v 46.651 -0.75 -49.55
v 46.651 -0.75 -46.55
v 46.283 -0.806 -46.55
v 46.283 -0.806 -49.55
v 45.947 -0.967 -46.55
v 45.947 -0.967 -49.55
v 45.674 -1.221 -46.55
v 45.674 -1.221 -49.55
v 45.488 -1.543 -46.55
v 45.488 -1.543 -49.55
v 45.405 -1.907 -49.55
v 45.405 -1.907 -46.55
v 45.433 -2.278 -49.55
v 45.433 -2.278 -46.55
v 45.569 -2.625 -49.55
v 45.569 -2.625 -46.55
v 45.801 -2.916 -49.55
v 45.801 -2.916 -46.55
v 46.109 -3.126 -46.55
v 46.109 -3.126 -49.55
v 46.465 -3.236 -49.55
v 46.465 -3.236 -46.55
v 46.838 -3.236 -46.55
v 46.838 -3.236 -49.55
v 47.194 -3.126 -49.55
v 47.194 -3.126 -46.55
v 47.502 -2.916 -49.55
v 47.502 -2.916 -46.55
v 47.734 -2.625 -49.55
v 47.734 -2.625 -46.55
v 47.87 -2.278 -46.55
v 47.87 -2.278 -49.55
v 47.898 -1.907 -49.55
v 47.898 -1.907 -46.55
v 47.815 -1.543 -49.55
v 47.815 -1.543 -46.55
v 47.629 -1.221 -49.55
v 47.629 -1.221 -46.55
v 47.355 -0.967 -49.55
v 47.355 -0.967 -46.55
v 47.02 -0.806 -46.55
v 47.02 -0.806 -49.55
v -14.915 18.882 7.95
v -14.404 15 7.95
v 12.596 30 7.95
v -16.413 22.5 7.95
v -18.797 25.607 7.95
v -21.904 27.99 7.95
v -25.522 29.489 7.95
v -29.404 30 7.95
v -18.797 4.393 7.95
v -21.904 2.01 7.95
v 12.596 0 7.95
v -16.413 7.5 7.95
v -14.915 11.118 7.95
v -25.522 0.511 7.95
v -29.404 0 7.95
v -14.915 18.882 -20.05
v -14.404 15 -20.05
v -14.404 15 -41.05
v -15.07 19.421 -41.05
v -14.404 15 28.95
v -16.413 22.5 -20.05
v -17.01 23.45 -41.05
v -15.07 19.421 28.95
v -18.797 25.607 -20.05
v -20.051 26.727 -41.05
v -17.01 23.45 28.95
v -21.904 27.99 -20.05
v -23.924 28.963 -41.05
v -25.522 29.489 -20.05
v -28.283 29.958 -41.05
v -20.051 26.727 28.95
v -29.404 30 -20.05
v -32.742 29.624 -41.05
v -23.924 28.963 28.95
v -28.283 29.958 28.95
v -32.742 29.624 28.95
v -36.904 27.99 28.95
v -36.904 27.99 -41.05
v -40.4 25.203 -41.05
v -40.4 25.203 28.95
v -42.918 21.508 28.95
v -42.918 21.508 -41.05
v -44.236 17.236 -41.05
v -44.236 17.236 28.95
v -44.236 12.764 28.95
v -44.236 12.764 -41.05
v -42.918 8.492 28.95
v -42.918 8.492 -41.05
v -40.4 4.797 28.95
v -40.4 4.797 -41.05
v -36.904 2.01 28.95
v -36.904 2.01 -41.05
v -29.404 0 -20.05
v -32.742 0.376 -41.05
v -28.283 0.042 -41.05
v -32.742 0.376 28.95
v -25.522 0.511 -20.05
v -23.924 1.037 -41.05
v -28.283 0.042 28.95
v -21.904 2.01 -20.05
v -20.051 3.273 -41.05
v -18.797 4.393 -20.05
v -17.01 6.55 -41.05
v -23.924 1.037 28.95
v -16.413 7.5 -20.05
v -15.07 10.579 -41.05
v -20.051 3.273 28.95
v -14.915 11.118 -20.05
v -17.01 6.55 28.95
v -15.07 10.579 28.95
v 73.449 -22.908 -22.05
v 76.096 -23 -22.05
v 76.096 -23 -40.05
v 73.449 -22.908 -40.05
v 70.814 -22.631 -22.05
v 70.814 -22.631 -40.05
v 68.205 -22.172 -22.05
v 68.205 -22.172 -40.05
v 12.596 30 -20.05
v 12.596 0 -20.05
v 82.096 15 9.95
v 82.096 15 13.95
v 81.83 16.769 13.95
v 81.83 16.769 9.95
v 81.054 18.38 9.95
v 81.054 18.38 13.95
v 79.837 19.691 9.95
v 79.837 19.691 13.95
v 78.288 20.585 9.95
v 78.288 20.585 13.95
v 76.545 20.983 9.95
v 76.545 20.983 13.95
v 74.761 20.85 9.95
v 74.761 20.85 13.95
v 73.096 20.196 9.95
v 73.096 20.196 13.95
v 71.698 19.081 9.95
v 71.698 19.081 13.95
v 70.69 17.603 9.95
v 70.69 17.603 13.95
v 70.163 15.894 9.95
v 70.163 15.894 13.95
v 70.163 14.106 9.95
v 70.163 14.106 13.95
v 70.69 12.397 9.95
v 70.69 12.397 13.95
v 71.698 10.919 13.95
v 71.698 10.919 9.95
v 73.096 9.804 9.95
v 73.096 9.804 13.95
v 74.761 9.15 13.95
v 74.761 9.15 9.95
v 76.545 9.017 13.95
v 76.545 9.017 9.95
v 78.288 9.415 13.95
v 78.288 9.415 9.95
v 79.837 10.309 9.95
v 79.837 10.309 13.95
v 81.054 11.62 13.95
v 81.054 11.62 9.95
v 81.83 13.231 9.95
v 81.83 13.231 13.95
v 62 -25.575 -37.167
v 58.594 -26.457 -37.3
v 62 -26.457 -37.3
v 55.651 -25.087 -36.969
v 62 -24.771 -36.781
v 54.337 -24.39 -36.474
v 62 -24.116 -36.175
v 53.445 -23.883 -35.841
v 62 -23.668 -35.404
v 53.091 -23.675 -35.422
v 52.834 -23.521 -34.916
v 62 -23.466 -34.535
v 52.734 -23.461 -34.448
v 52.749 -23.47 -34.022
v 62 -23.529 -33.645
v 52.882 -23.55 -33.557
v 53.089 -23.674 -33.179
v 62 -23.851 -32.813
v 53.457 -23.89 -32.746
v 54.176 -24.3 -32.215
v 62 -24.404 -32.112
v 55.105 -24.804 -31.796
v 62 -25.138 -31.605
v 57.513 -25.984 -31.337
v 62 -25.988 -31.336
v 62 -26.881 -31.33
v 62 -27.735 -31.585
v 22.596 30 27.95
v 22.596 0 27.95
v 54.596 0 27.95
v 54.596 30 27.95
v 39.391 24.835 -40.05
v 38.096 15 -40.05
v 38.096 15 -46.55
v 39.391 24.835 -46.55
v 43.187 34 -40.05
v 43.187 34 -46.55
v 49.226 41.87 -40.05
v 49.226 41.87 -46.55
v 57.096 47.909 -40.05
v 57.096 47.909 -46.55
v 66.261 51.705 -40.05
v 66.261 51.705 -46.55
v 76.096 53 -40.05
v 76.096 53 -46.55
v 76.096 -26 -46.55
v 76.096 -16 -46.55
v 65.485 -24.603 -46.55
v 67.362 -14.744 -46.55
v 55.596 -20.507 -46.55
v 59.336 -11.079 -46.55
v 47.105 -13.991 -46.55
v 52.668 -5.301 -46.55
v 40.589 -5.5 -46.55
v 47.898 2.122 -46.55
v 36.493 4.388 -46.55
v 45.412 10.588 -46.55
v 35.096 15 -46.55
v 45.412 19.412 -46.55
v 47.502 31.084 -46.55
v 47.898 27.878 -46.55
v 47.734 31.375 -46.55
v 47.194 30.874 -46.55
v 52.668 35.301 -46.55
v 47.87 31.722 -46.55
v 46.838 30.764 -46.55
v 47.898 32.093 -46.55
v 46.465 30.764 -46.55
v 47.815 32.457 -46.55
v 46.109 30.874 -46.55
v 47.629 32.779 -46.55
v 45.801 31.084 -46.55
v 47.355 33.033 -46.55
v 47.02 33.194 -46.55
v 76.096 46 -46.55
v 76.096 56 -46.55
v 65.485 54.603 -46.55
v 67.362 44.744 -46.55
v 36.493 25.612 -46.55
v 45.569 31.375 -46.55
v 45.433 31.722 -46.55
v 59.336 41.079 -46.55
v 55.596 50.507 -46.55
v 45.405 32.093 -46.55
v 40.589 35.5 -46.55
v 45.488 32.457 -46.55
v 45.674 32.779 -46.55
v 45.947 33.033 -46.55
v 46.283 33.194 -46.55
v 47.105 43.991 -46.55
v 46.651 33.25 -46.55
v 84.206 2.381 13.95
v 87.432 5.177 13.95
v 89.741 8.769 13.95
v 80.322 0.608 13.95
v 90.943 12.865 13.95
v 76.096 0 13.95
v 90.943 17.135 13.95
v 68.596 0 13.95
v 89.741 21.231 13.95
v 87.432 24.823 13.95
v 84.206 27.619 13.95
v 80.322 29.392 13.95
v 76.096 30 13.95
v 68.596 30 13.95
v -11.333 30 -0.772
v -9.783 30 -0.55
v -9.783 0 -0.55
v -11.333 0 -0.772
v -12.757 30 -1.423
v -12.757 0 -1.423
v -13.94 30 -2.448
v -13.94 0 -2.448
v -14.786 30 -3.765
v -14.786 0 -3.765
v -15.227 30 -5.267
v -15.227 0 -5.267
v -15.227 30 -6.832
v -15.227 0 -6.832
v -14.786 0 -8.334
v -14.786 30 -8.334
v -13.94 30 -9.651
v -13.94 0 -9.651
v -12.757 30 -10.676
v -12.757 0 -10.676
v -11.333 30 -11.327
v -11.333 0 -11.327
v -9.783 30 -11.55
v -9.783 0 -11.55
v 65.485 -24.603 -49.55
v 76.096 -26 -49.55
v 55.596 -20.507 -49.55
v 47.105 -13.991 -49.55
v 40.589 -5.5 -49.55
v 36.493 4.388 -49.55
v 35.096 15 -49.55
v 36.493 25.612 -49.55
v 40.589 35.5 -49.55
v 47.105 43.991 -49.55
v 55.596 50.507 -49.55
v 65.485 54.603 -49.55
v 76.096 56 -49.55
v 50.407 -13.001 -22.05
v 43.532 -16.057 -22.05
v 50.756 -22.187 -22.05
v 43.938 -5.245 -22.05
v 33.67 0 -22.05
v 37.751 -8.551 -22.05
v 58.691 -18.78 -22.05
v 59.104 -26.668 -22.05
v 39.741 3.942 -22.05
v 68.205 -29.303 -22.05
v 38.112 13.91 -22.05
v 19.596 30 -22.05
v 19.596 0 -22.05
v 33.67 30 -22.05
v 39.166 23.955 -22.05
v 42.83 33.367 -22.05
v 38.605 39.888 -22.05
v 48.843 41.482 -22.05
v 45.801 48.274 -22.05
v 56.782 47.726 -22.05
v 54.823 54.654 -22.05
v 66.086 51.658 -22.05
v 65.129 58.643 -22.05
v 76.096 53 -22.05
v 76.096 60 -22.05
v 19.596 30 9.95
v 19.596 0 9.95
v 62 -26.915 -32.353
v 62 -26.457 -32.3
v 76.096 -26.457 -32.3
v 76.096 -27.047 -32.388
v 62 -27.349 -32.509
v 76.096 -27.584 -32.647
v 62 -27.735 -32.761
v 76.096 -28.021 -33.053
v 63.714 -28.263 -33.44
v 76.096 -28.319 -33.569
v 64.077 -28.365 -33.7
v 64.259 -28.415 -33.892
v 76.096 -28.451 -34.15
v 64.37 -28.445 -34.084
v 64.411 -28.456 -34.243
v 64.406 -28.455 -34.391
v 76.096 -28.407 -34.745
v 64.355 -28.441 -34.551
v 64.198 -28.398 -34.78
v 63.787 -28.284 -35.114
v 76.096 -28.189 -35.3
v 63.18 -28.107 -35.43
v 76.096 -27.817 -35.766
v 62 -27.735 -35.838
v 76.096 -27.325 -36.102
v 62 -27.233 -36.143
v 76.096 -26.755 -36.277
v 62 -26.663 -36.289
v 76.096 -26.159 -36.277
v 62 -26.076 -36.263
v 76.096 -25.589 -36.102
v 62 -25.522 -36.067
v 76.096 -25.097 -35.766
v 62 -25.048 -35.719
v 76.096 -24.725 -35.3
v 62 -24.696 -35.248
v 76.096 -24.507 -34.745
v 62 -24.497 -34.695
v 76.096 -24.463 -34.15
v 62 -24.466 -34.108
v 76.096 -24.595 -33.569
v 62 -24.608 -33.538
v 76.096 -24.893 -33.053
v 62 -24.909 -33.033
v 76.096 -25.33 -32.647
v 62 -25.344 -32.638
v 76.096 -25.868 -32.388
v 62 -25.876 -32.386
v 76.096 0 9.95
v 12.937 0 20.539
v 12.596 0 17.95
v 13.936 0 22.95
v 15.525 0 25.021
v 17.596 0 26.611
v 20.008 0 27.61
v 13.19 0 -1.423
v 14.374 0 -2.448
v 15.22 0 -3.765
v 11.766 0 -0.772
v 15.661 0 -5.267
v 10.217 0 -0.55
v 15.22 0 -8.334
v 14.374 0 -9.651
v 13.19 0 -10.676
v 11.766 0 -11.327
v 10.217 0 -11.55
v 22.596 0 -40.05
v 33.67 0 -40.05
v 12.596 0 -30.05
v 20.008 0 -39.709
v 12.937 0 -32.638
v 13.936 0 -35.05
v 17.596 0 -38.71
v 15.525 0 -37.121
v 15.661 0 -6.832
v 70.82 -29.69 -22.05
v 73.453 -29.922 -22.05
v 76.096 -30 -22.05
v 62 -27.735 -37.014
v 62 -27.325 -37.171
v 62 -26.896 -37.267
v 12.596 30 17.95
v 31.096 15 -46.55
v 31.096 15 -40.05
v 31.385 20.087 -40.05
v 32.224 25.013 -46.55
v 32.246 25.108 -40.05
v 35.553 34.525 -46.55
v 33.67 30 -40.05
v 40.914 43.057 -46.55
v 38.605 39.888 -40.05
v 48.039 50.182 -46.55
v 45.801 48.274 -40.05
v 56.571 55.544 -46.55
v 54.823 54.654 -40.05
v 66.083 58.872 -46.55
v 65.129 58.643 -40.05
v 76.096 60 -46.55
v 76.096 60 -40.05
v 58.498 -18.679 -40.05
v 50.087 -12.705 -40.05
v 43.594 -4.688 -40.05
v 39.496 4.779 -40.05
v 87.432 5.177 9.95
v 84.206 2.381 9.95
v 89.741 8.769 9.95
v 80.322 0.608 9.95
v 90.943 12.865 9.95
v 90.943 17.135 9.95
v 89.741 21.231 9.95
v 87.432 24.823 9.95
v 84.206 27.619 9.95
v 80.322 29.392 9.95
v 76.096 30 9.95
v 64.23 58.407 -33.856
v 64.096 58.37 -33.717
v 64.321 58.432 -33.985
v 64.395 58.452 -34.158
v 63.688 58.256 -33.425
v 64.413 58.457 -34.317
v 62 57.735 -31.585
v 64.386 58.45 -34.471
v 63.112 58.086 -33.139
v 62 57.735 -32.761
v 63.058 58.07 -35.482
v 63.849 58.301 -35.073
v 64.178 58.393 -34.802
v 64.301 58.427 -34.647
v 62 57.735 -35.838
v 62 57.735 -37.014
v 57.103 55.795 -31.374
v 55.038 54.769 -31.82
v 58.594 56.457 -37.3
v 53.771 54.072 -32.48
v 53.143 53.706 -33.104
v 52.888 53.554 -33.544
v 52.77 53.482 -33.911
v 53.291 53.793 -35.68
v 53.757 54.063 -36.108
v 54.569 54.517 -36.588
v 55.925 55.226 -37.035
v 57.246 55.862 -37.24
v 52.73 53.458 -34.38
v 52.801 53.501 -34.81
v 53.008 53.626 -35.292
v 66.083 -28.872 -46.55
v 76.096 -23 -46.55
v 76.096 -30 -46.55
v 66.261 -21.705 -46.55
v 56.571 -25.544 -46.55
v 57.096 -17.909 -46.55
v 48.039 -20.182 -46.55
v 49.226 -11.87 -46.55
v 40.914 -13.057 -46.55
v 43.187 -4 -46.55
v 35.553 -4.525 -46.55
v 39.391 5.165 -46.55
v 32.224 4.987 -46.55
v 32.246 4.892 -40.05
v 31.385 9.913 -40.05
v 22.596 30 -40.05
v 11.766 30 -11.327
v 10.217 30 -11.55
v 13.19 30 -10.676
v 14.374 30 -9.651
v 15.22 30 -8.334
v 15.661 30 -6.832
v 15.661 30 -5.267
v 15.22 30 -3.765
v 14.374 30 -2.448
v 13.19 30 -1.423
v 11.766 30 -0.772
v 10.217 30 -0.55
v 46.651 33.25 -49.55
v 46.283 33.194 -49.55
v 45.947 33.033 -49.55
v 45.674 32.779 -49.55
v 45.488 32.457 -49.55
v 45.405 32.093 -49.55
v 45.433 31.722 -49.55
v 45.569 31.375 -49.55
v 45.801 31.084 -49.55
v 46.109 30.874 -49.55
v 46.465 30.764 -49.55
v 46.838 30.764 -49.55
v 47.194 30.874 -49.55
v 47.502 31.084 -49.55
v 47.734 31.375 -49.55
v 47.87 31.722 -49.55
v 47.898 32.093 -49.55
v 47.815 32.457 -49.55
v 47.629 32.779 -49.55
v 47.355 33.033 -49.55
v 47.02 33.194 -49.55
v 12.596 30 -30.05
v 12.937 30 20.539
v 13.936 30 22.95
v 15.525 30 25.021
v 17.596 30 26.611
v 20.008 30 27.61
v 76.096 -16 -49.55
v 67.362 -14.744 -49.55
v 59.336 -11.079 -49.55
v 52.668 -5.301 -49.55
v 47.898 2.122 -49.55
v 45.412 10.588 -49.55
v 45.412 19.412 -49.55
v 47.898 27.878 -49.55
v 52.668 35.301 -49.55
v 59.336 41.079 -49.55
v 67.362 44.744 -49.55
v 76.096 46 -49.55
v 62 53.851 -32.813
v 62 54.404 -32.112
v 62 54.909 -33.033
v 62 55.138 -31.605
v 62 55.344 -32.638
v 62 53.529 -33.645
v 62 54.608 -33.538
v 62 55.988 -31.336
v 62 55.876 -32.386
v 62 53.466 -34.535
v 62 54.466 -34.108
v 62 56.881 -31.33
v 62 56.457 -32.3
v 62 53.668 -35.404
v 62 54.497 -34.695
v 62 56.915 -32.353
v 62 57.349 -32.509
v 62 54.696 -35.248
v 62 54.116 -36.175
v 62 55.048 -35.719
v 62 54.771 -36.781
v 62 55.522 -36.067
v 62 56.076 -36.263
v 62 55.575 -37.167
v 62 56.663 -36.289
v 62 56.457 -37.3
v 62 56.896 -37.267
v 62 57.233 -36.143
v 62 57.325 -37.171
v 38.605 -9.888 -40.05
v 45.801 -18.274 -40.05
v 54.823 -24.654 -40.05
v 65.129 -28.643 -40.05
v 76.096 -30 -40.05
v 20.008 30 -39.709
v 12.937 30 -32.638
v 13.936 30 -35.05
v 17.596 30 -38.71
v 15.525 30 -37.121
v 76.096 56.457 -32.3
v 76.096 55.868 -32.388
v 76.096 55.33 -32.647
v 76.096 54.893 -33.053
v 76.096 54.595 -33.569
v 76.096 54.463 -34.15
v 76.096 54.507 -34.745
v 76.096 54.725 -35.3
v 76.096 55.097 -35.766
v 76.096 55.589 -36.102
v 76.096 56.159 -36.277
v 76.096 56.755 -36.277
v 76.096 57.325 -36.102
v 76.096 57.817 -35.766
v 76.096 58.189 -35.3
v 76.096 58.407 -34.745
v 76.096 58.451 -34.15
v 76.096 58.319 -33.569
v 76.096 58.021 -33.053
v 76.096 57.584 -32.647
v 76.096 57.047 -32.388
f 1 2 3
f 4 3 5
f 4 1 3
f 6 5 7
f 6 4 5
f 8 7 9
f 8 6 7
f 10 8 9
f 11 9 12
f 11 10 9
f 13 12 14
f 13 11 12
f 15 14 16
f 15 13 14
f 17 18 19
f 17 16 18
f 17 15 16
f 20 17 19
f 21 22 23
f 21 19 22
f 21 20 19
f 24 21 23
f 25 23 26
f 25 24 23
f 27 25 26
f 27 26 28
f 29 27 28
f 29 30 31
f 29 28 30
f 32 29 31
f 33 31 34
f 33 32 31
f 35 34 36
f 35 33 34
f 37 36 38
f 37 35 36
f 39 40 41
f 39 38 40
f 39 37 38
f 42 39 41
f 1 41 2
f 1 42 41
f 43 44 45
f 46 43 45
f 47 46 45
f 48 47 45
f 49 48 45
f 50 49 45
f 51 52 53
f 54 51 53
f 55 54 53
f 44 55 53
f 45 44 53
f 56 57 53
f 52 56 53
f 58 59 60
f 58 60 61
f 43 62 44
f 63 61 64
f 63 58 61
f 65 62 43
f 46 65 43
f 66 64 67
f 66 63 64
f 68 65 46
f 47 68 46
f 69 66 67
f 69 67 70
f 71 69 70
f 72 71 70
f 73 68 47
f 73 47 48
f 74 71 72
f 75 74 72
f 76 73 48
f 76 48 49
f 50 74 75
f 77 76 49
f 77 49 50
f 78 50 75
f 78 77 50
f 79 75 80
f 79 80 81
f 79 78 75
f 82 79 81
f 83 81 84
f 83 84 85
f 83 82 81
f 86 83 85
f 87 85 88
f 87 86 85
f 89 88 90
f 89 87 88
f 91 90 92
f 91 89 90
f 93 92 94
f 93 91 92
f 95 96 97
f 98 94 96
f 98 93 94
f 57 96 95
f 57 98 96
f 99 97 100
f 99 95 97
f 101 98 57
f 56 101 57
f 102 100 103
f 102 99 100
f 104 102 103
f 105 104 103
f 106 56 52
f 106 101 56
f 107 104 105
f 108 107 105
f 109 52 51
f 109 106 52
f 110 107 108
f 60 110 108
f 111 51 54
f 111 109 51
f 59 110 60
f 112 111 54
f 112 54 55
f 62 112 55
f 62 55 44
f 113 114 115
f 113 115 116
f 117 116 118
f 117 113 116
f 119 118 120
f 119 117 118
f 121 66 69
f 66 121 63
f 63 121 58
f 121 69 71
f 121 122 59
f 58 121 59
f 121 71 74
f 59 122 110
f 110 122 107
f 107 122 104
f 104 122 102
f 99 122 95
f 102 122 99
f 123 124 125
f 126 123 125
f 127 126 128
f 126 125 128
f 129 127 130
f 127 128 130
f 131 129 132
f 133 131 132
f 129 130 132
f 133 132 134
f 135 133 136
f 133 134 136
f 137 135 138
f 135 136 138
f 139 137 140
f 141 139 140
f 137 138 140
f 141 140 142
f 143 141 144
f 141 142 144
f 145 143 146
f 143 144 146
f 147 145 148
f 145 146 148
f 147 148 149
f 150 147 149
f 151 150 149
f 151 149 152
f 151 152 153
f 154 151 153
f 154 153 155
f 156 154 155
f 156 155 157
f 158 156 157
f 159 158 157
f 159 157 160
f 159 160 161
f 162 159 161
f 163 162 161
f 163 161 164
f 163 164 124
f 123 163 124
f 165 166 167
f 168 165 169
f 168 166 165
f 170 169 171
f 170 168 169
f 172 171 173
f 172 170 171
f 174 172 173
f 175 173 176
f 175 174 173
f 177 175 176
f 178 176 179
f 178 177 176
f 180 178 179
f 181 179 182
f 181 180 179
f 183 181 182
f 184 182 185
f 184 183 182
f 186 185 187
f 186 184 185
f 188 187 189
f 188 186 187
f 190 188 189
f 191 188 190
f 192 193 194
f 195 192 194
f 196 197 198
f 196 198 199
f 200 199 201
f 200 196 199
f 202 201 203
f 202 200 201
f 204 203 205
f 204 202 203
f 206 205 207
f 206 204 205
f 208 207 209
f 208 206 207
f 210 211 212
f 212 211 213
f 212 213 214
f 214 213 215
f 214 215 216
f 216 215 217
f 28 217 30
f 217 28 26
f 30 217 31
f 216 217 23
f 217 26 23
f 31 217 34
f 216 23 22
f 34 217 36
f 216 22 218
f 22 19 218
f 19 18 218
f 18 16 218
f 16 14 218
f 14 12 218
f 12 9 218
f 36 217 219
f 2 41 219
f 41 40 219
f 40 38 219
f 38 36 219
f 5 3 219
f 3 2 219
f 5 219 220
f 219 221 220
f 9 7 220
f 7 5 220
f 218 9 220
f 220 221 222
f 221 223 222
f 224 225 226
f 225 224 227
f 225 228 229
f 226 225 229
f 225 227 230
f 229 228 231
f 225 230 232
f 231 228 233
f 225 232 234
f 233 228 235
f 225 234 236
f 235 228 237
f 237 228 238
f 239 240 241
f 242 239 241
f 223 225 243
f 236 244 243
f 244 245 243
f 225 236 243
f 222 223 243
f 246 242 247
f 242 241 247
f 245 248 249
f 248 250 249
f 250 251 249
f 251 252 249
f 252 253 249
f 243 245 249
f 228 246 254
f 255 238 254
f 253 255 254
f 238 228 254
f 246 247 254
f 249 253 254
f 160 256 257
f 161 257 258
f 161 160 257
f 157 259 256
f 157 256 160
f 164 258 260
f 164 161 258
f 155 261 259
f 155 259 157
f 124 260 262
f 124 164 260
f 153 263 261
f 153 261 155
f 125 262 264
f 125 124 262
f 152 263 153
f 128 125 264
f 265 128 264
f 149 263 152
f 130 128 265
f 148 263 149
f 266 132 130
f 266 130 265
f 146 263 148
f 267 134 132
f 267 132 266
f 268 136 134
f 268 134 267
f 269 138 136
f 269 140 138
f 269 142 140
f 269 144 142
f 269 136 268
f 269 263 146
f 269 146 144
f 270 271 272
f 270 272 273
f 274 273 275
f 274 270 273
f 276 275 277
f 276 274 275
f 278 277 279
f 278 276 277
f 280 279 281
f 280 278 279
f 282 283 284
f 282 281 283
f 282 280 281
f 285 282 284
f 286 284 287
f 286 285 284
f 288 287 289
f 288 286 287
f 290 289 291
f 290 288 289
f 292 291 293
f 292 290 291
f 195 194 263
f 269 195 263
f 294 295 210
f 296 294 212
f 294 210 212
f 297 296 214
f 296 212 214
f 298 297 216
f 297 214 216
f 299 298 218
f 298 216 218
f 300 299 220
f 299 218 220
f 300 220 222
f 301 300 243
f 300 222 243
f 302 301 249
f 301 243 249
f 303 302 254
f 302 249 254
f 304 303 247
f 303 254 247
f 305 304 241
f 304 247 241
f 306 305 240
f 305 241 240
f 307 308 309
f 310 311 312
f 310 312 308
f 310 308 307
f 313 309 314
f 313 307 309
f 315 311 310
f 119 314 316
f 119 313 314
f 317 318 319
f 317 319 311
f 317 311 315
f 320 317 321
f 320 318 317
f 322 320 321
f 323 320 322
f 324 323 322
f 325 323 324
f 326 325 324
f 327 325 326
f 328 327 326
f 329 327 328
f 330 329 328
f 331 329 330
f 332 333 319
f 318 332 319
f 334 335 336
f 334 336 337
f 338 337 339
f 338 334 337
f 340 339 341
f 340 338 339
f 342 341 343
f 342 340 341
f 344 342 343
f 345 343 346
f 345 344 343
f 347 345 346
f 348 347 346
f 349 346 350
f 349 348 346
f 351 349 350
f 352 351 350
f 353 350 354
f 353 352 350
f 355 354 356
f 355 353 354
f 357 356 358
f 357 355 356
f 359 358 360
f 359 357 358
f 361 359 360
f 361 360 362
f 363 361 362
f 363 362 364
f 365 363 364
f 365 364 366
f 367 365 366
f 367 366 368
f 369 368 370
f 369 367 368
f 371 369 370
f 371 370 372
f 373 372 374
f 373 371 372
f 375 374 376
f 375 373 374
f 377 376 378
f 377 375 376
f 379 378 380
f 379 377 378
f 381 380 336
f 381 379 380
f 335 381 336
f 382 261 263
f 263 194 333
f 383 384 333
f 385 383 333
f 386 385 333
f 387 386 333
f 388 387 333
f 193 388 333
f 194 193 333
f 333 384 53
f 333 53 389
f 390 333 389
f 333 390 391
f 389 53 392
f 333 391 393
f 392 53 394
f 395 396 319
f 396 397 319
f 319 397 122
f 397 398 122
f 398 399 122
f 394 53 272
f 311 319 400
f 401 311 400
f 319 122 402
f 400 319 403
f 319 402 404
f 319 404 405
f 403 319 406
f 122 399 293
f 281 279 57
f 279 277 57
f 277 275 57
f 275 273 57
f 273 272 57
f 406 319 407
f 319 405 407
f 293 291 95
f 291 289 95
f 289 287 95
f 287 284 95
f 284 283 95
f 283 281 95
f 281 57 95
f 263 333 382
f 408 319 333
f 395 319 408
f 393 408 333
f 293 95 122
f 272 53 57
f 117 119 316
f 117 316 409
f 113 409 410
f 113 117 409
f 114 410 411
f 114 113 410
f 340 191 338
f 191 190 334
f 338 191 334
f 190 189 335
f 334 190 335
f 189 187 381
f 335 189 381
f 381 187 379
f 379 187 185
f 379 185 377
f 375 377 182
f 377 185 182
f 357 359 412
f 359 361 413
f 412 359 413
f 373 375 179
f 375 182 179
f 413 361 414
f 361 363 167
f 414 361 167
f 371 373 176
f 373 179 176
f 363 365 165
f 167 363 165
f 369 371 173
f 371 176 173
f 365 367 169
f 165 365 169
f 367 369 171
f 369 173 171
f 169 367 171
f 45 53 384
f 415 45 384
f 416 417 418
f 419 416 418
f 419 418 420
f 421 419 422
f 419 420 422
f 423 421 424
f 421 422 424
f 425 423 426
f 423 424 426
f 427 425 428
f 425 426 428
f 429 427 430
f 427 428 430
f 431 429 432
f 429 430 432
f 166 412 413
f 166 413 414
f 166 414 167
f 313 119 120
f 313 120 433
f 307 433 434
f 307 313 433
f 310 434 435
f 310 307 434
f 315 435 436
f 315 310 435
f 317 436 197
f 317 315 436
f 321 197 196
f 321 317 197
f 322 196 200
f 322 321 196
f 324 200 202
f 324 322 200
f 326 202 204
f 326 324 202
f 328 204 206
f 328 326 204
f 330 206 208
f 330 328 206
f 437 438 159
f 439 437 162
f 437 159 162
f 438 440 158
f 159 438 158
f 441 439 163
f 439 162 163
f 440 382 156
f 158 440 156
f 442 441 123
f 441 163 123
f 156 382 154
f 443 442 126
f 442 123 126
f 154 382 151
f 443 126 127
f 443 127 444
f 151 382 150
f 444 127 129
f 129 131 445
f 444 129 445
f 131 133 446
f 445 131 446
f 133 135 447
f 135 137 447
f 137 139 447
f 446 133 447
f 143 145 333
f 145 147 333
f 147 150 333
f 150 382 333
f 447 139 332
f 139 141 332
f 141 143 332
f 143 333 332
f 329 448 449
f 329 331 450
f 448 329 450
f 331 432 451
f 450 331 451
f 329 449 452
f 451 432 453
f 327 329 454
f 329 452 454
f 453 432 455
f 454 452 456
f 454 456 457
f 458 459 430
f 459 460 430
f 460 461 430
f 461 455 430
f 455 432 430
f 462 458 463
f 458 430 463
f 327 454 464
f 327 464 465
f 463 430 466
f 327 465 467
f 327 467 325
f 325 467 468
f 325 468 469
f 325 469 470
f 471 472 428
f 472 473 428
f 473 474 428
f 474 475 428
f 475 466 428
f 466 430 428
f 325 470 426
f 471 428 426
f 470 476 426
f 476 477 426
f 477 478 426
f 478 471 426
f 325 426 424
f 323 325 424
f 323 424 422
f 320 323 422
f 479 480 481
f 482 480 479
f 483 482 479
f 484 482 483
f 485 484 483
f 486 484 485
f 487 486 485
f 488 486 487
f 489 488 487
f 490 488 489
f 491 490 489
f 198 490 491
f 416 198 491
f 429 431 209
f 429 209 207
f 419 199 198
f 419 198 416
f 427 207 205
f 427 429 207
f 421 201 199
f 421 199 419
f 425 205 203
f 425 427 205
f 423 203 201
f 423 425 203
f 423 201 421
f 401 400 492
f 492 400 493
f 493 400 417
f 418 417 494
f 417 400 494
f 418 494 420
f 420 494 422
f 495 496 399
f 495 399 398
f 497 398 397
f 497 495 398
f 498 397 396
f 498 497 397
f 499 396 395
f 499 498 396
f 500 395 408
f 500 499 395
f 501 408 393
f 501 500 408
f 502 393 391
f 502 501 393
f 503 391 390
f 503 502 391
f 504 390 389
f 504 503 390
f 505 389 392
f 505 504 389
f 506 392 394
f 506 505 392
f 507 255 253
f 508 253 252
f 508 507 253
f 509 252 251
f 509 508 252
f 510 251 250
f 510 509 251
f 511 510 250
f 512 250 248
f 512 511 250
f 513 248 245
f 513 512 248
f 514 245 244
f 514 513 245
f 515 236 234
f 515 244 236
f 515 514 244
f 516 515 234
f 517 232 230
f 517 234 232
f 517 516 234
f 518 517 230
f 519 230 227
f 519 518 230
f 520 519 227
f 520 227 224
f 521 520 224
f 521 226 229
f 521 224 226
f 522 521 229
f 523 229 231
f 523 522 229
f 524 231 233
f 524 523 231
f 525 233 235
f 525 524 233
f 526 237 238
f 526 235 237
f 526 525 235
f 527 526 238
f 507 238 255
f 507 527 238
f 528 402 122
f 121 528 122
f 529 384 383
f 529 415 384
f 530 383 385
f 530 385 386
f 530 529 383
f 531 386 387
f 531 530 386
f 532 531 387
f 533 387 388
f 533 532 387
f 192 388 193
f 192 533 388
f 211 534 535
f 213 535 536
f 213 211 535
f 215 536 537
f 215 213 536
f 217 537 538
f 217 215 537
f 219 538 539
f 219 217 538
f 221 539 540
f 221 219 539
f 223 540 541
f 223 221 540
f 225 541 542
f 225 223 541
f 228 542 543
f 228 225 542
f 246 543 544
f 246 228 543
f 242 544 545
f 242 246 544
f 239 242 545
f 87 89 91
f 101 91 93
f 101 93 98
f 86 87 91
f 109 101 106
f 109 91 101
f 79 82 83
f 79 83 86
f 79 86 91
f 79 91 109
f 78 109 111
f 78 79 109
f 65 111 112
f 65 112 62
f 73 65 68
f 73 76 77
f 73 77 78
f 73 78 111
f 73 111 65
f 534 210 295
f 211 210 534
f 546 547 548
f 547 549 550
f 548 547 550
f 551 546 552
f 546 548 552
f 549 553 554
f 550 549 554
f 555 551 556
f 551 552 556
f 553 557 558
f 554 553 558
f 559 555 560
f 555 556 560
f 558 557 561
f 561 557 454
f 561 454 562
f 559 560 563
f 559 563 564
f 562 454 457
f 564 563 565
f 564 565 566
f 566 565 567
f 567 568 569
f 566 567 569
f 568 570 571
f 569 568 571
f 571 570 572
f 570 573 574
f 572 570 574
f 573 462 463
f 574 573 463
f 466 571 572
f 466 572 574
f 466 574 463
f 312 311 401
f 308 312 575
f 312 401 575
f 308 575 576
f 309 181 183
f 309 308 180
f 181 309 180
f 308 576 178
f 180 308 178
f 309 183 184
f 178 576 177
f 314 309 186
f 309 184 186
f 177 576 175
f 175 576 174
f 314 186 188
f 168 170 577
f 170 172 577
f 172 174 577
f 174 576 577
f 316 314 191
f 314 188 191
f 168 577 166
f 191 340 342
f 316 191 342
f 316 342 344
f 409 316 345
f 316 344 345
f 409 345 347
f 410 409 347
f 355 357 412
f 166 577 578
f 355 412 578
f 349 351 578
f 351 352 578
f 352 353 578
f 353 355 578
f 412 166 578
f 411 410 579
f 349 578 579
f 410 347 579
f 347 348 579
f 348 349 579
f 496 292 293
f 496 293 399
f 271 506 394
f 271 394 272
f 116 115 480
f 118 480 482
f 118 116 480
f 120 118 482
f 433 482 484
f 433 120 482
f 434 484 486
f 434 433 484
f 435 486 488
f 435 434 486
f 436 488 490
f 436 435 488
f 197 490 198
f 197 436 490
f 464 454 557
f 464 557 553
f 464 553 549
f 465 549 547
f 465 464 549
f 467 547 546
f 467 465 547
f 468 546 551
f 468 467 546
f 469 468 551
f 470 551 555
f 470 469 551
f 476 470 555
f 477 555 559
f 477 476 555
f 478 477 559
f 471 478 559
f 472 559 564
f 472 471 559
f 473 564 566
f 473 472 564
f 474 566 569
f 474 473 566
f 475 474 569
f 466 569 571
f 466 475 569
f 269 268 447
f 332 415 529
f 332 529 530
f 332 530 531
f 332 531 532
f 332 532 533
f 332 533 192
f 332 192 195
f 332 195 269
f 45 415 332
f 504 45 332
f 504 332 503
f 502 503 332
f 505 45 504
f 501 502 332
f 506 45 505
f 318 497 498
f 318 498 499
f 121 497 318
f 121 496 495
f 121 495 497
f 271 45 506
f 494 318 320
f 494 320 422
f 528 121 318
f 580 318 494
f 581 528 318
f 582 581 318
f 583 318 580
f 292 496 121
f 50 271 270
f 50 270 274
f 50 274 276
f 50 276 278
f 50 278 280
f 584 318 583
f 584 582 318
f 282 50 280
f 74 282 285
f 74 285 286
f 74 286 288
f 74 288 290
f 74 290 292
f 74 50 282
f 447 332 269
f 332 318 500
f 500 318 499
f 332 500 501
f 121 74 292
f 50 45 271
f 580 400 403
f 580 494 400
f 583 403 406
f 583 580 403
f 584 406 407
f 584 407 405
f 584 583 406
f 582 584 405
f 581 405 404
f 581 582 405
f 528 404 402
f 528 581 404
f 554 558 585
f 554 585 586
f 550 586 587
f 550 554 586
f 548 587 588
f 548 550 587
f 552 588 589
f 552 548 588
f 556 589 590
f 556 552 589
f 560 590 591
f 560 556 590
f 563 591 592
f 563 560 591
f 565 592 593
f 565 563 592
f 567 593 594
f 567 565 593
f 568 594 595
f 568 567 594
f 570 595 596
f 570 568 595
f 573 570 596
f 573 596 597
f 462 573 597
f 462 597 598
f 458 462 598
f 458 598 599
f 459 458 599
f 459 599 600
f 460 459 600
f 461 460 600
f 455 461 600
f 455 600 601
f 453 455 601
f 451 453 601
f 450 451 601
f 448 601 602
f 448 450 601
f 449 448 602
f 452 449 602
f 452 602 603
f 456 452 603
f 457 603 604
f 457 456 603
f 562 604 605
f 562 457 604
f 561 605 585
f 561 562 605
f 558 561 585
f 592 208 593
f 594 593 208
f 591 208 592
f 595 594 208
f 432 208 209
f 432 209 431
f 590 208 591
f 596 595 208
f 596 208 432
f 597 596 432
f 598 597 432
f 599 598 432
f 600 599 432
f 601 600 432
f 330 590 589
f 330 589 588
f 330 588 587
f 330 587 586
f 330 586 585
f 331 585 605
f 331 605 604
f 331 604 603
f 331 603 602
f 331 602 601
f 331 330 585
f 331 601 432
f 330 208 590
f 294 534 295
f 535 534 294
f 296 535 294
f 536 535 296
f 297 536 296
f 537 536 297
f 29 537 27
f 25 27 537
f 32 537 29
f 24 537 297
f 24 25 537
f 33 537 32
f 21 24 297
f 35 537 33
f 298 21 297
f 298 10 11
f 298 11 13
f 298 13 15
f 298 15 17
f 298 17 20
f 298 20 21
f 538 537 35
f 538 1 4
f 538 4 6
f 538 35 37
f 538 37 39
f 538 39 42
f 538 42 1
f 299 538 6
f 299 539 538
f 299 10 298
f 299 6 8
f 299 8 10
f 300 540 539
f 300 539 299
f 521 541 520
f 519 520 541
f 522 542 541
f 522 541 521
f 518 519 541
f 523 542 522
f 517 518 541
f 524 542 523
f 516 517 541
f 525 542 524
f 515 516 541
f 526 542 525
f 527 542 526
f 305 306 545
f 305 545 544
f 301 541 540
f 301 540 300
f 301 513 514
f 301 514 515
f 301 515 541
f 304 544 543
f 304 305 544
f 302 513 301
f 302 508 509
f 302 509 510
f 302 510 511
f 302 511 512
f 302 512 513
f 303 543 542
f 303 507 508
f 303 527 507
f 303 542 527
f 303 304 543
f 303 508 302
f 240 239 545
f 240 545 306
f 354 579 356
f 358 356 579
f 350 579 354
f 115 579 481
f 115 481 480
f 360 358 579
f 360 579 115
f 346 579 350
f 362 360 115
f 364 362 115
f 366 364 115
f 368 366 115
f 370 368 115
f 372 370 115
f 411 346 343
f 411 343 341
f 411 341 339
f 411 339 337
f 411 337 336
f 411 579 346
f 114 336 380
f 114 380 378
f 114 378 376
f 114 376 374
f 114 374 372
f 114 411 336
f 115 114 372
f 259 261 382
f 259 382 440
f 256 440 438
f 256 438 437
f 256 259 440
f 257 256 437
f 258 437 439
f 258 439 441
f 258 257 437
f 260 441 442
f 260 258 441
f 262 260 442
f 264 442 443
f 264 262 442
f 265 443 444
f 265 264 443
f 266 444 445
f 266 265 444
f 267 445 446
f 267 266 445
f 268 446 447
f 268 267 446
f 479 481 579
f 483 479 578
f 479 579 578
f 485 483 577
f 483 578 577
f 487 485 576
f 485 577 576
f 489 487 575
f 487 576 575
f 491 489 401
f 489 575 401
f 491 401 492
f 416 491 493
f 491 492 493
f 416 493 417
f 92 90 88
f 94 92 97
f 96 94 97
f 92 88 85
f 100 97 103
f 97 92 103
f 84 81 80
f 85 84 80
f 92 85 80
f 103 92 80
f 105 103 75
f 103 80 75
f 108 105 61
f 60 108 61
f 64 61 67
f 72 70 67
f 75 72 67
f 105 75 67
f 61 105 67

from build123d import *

# Parameters (mm, degrees)
BOSS_EXTRUDE1_DEPTH        = 30
FILLET1_R                  = 10
SKETCH4_R                  = 15
BOSS_EXTRUDE2_DEPTH        = 35
CUT_EXTRUDE1_DEPTH         = 70
SKETCH8_R                  = 6.000000000000003
CUT_EXTRUDE2_DEPTH         = 100
SKETCH9_W                  = 3.9999999999999982
SKETCH9_H                  = 30.000000000000004
BOSS_EXTRUDE3_DEPTH        = 10
CUT_EXTRUDE4_DEPTH         = 15
BOSS_EXTRUDE4_DEPTH        = 18
CUT_EXTRUDE8_START         = -18
CUT_EXTRUDE8_DEPTH         = 18
BOSS_EXTRUDE5_DEPTH        = 18
SKETCH18_R                 = 44.999999999999964
SKETCH18_R_2               = 37.99999999999997
BOSS_EXTRUDE6_DEPTH        = 6.5
SKETCH20_R                 = 41
SKETCH20_R_2               = 31
BOSS_EXTRUDE7_DEPTH        = 3
CUT_EXTRUDE15_START        = -27.5
CUT_EXTRUDE15_DEPTH        = 27.5
SKETCH27_R                 = 2.0000000000000036
CUT_EXTRUDE18_DEPTH        = 1000
CUT_EXTRUDE19_DEPTH        = 120.80681590516343
SKETCH29_R                 = 3.0000000000000018
CUT_EXTRUDE20_DEPTH        = 62
M3_TAPPED_HOLE1_AT_2_COUNT = 2
M3_TAPPED_HOLE1_AT_2_PITCH = 34.00000000000008


# Read off the part's stored shape, not the designer's step: Cut-Extrude15
with BuildPart() as part:
    # Sketch1 → Boss-Extrude1 (new body)
    with BuildSketch(Plane(origin=(0, 0, 0), x_dir=(1, 0, 0), z_dir=(0, 1, 0))):
        Polygon((-29.403832198091994, 20.049584631360354), (-29.403832198091994, -7.950415368639647), (12.596167801908011, -7.9504153686396455), (12.596167801908013, -27.950415368639646), (83.59616780190801, -27.950415368639643), (83.59616780190801, -9.950415368639646), (19.596167801908006, -9.950415368639622), (19.596167801908013, 22.049584631360172), (83.596167801908, 22.049584631360354), (83.596167801908, 40.049584631360354), (12.596167801908003, 40.049584631360354), (12.596167801908011, 20.04958463136035), align=None)
    extrude(amount=BOSS_EXTRUDE1_DEPTH)

    # Fillet1
    fillet1_edges = [part.edges().sort_by_distance(p)[0] for p in [
        (12.596167801908003, 15, -40.049584631360354),
        (12.596167801908013, 15, 27.950415368639646),
    ]]
    fillet(fillet1_edges, radius=FILLET1_R)

    # Sketch4 → Boss-Extrude2 (add, symmetric)
    with BuildSketch(Plane.XY.offset(-6.049584631360346)):
        with Locations((-29.403832198091994, 15)):
            Circle(SKETCH4_R)
    extrude(amount=BOSS_EXTRUDE2_DEPTH, both=True)

    # Sketch5 → Cut-Extrude1 (cut)
    with BuildSketch(Plane(origin=(0, 30, 0), x_dir=(1, 0, 0), z_dir=(0, 1, 0))):
        Polygon((54.59616780190807, -27.950415368639646), (68.59616780190801, -13.950415368639645), (83.59616780190801, -13.950415368639646), (83.59616780190801, -27.950415368639643), align=None)
    extrude(amount=-CUT_EXTRUDE1_DEPTH, mode=Mode.SUBTRACT)

    # Sketch8 → Cut-Extrude2 (cut)
    with BuildSketch(Plane.XY.offset(13.950415368639636)):
        with Locations((76.09616780190801, 14.999999999999998)):
            Circle(SKETCH8_R)
    extrude(amount=-CUT_EXTRUDE2_DEPTH, mode=Mode.SUBTRACT)

    # Sketch9 → Boss-Extrude3 (add)
    with BuildSketch(Plane(origin=(83.59616780190801, 0, 0), x_dir=(0, 0, -1), z_dir=(1, 0, 0))):
        with Locations((-11.950415368639668, 15.000000000000002)):
            Rectangle(SKETCH9_W, SKETCH9_H)
    extrude(amount=BOSS_EXTRUDE3_DEPTH)

    # Sketch14 → Cut-Extrude4 (cut)
    with BuildSketch(Plane.XY.offset(13.950415368639636)):
        with BuildLine():
            Line((76.09616780190801, 30), (93.59616780190801, 30))
            Line((93.59616780190801, 30), (93.59616780190801, 0))
            Line((93.59616780190801, 0), (76.09616780190801, 0))
            ThreePointArc((76.09616780190801, 0), (91.09616780190801, 14.999999999999998), (76.09616780190801, 30))
        make_face()
    extrude(amount=-CUT_EXTRUDE4_DEPTH, mode=Mode.SUBTRACT)

    # Sketch13 → Boss-Extrude4 (add)
    with BuildSketch(Plane(origin=(0, 0, -40.049584631360354), x_dir=(-1, 0, -2.3e-16), z_dir=(2.3e-16, 0, -1))):
        with BuildLine():
            Line((-76.09616780190801, -29.999999999999993), (-76.09616780190802, 59.99999999999999))
            ThreePointArc((-76.09616780190802, 59.99999999999999), (-31.096167801908017, 15.000000000000009), (-76.09616780190801, -29.999999999999993))
        make_face()
    extrude(amount=-BOSS_EXTRUDE4_DEPTH)

    # Sketch16 → Cut-Extrude8 (cut)
    with BuildSketch(Plane(origin=(0, 0, -40.049584631360354), x_dir=(-1, 0, -7.8e-16), z_dir=(7.8e-16, 0, -1)).offset(CUT_EXTRUDE8_START)):
        with BuildLine():
            ThreePointArc((-76.09616780190801, -23), (-38.09616780190802, 15.000000000000009), (-76.09616780190804, 52.999999999999986))
            Line((-76.09616780190804, 52.99999999999999), (-76.09616780190802, 30))
            ThreePointArc((-76.09616780190802, 30.000000000000004), (-61.09616780190801, 15.000000000000012), (-76.09616780190801, 3.55e-15))
            Line((-76.09616780190802, 0), (-76.09616780190801, -22.999999999999993))
        make_face()
        with BuildLine():
            Line((-76.09616780190802, 20.999999999999996), (-76.09616780190802, 30))
            Line((-76.09616780190802, 30), (-83.596167801908, 30))
            Line((-83.596167801908, 30), (-83.596167801908, 0))
            Line((-83.596167801908, 0), (-76.09616780190801, -6.94e-15))
            Line((-76.09616780190802, 0), (-76.09616780190802, 8.999999999999993))
            ThreePointArc((-76.09616780190801, 8.999999999999996), (-82.09616780190801, 14.999999999999996), (-76.09616780190801, 20.999999999999996))
        make_face()
        with BuildLine():
            ThreePointArc((-76.09616780190801, 3.55e-15), (-61.09616780190801, 15.000000000000012), (-76.09616780190802, 30.000000000000004))
            Line((-76.09616780190802, 30), (-76.09616780190802, 20.999999999999996))
            Line((-76.09616780190802, 20.999999999999996), (-76.09616780190802, 8.999999999999993))
            Line((-76.09616780190802, 8.999999999999993), (-76.09616780190802, 0))
        make_face()
    extrude(amount=CUT_EXTRUDE8_DEPTH, mode=Mode.SUBTRACT)

    # Sketch17 → Boss-Extrude5 (add)
    with BuildSketch(Plane(origin=(0, 0, -40.049584631360354), x_dir=(-1, 0, -7.8e-16), z_dir=(7.8e-16, 0, -1))):
        with BuildLine():
            Line((-76.09616780190802, 59.99999999999999), (-76.09616780190804, 52.99999999999998))
            ThreePointArc((-76.09616780190804, 52.99999999999998), (-113.88848540609249, 11.032541102361632), (-68.20461692079768, -22.17154052081842))
            Line((-68.20461692079768, -22.17154052081842), (-68.20461692079766, -29.302634511853192))
            ThreePointArc((-68.20461692079766, -29.302634511853192), (-120.92148739381611, 11.038848212539316), (-76.09616780190802, 59.99999999999999))
        make_face()
    extrude(amount=-BOSS_EXTRUDE5_DEPTH)

    # Sketch18 → Boss-Extrude6 (add)
    with BuildSketch(Plane(origin=(0, 0, -40.049584631360354), x_dir=(-1, 0, -7.8e-16), z_dir=(7.8e-16, 0, -1))):
        with Locations((-76.09616780190805, 14.999999999999998)):
            Circle(SKETCH18_R)
        with Locations((-76.09616780190805, 14.999999999999998)):
            Circle(SKETCH18_R_2, mode=Mode.SUBTRACT)
    extrude(amount=BOSS_EXTRUDE6_DEPTH)


with BuildPart() as body_2:
    # Sketch20 → Boss-Extrude7 (new body)
    with BuildSketch(Plane(origin=(3.639e-14, 0, -46.549584631360354), x_dir=(-1, 0, -7.8e-16), z_dir=(7.8e-16, 0, -1))):
        with Locations((-76.09616780190802, 14.999999999999998)):
            Circle(SKETCH20_R)
        with Locations((-76.09616780190802, 14.999999999999998)):
            Circle(SKETCH20_R_2, mode=Mode.SUBTRACT)
    extrude(amount=BOSS_EXTRUDE7_DEPTH)


with BuildPart() as cut_extrude15_tool:
    # Cut-Extrude15 outline → Cut-Extrude15 (new body)
    with BuildSketch(Plane(origin=(3.874e-14, 0, -49.549584631360354), x_dir=(-1, 0, -7.8e-16), z_dir=(7.8e-16, 0, -1)).offset(CUT_EXTRUDE15_START)):
        with BuildLine():
            ThreePointArc((-76.096167802, -16), (-107.096167802, 15), (-76.096167802, 46))
            Line((-76.096167802, 46), (-76.096167802, 60))
            ThreePointArc((-76.096167802, 60), (-121.096167802, 15), (-76.096167802, -30))
            Line((-76.096167802, -30), (-76.096167802, -16))
        make_face()
    extrude(amount=CUT_EXTRUDE15_DEPTH)


with BuildPart() as part_1:
    add(part.part)

    # Cut-Extrude15: cut by cut_extrude15_tool
    add(cut_extrude15_tool.part, mode=Mode.SUBTRACT)

    # Sketch27 → Cut-Extrude18 (cut)
    with BuildSketch(Plane(origin=(0, 0, 0), x_dir=(0, 0, -1), z_dir=(1, 0, 0))):
        with Locations(Location((34.29958463136034, 56.45704467353929, 0), (0, 0, 180))):
            Circle(SKETCH27_R)
        with Locations(Location((34.29958463136034, -26.457044673539237, 0), (0, 0, 180))):
            Circle(SKETCH27_R)
    extrude(amount=CUT_EXTRUDE18_DEPTH, mode=Mode.SUBTRACT)

    # Sketch28 → Cut-Extrude19 (cut, through all)
    with BuildSketch(Plane(origin=(0, 30, 0), x_dir=(1, 0, 0), z_dir=(0, 1, 0))):
        with BuildLine():
            Line((-9.783074876156928, 11.549584631360354), (10.216925123843072, 11.549584631360354))
            ThreePointArc((10.216925123843072, 11.549584631360354), (15.716925123843072, 6.0495846313603545), (10.216925123843072, 0.5495846313603534))
            Line((10.216925123843072, 0.5495846313603534), (-9.783074876156928, 0.5495846313603552))
            ThreePointArc((-9.783074876156928, 0.5495846313603552), (-15.28307487615696, 6.0495846313603225), (-9.783074876156928, 11.549584631360354))
        make_face()
    extrude(amount=-CUT_EXTRUDE19_DEPTH, mode=Mode.SUBTRACT)

    # Sketch29 → Cut-Extrude20 (cut)
    with BuildSketch(Plane(origin=(0, 0, 0), x_dir=(0, 0, -1), z_dir=(1, 0, 0))):
        with Locations((34.29958463136034, 56.45704467353929)):
            Circle(SKETCH29_R)
        with Locations((34.29958463136034, -26.457044673539237)):
            Circle(SKETCH29_R)
    extrude(amount=CUT_EXTRUDE20_DEPTH, mode=Mode.SUBTRACT)


with BuildPart() as body_2_1:
    add(body_2.part)

    # Cut-Extrude15: cut by cut_extrude15_tool
    add(cut_extrude15_tool.part, mode=Mode.SUBTRACT)

    # Sketch31 → M3 Tapped Hole1 (revolve, cut)
    with BuildSketch(Plane(origin=(46.65130407323663, 32.00000000000077, -49.54958463136032), x_dir=(0, 1, 0), z_dir=(1, 0, 7.8e-16))):
        Polygon((0, 0), (-1.923e-14, 78.50000000000006), (1.2499999999999898, 78.50000000000006), (1.2499999999999871, -1.4e-15), align=None)
    m3_tapped_hole1 = revolve(axis=Axis((46.65130407323664, 32.00000000000077, -55.89958463136031), (-8.1e-16, 0, 1)), mode=Mode.SUBTRACT)

    # M3 Tapped Hole1 at 2: M3 Tapped Hole1 ×2
    with Locations(*[(0, -i * M3_TAPPED_HOLE1_AT_2_PITCH, 0) for i in range(1, M3_TAPPED_HOLE1_AT_2_COUNT)]):
        add(m3_tapped_hole1, mode=Mode.SUBTRACT)


solid = Compound([part_1.part, body_2_1.part])
